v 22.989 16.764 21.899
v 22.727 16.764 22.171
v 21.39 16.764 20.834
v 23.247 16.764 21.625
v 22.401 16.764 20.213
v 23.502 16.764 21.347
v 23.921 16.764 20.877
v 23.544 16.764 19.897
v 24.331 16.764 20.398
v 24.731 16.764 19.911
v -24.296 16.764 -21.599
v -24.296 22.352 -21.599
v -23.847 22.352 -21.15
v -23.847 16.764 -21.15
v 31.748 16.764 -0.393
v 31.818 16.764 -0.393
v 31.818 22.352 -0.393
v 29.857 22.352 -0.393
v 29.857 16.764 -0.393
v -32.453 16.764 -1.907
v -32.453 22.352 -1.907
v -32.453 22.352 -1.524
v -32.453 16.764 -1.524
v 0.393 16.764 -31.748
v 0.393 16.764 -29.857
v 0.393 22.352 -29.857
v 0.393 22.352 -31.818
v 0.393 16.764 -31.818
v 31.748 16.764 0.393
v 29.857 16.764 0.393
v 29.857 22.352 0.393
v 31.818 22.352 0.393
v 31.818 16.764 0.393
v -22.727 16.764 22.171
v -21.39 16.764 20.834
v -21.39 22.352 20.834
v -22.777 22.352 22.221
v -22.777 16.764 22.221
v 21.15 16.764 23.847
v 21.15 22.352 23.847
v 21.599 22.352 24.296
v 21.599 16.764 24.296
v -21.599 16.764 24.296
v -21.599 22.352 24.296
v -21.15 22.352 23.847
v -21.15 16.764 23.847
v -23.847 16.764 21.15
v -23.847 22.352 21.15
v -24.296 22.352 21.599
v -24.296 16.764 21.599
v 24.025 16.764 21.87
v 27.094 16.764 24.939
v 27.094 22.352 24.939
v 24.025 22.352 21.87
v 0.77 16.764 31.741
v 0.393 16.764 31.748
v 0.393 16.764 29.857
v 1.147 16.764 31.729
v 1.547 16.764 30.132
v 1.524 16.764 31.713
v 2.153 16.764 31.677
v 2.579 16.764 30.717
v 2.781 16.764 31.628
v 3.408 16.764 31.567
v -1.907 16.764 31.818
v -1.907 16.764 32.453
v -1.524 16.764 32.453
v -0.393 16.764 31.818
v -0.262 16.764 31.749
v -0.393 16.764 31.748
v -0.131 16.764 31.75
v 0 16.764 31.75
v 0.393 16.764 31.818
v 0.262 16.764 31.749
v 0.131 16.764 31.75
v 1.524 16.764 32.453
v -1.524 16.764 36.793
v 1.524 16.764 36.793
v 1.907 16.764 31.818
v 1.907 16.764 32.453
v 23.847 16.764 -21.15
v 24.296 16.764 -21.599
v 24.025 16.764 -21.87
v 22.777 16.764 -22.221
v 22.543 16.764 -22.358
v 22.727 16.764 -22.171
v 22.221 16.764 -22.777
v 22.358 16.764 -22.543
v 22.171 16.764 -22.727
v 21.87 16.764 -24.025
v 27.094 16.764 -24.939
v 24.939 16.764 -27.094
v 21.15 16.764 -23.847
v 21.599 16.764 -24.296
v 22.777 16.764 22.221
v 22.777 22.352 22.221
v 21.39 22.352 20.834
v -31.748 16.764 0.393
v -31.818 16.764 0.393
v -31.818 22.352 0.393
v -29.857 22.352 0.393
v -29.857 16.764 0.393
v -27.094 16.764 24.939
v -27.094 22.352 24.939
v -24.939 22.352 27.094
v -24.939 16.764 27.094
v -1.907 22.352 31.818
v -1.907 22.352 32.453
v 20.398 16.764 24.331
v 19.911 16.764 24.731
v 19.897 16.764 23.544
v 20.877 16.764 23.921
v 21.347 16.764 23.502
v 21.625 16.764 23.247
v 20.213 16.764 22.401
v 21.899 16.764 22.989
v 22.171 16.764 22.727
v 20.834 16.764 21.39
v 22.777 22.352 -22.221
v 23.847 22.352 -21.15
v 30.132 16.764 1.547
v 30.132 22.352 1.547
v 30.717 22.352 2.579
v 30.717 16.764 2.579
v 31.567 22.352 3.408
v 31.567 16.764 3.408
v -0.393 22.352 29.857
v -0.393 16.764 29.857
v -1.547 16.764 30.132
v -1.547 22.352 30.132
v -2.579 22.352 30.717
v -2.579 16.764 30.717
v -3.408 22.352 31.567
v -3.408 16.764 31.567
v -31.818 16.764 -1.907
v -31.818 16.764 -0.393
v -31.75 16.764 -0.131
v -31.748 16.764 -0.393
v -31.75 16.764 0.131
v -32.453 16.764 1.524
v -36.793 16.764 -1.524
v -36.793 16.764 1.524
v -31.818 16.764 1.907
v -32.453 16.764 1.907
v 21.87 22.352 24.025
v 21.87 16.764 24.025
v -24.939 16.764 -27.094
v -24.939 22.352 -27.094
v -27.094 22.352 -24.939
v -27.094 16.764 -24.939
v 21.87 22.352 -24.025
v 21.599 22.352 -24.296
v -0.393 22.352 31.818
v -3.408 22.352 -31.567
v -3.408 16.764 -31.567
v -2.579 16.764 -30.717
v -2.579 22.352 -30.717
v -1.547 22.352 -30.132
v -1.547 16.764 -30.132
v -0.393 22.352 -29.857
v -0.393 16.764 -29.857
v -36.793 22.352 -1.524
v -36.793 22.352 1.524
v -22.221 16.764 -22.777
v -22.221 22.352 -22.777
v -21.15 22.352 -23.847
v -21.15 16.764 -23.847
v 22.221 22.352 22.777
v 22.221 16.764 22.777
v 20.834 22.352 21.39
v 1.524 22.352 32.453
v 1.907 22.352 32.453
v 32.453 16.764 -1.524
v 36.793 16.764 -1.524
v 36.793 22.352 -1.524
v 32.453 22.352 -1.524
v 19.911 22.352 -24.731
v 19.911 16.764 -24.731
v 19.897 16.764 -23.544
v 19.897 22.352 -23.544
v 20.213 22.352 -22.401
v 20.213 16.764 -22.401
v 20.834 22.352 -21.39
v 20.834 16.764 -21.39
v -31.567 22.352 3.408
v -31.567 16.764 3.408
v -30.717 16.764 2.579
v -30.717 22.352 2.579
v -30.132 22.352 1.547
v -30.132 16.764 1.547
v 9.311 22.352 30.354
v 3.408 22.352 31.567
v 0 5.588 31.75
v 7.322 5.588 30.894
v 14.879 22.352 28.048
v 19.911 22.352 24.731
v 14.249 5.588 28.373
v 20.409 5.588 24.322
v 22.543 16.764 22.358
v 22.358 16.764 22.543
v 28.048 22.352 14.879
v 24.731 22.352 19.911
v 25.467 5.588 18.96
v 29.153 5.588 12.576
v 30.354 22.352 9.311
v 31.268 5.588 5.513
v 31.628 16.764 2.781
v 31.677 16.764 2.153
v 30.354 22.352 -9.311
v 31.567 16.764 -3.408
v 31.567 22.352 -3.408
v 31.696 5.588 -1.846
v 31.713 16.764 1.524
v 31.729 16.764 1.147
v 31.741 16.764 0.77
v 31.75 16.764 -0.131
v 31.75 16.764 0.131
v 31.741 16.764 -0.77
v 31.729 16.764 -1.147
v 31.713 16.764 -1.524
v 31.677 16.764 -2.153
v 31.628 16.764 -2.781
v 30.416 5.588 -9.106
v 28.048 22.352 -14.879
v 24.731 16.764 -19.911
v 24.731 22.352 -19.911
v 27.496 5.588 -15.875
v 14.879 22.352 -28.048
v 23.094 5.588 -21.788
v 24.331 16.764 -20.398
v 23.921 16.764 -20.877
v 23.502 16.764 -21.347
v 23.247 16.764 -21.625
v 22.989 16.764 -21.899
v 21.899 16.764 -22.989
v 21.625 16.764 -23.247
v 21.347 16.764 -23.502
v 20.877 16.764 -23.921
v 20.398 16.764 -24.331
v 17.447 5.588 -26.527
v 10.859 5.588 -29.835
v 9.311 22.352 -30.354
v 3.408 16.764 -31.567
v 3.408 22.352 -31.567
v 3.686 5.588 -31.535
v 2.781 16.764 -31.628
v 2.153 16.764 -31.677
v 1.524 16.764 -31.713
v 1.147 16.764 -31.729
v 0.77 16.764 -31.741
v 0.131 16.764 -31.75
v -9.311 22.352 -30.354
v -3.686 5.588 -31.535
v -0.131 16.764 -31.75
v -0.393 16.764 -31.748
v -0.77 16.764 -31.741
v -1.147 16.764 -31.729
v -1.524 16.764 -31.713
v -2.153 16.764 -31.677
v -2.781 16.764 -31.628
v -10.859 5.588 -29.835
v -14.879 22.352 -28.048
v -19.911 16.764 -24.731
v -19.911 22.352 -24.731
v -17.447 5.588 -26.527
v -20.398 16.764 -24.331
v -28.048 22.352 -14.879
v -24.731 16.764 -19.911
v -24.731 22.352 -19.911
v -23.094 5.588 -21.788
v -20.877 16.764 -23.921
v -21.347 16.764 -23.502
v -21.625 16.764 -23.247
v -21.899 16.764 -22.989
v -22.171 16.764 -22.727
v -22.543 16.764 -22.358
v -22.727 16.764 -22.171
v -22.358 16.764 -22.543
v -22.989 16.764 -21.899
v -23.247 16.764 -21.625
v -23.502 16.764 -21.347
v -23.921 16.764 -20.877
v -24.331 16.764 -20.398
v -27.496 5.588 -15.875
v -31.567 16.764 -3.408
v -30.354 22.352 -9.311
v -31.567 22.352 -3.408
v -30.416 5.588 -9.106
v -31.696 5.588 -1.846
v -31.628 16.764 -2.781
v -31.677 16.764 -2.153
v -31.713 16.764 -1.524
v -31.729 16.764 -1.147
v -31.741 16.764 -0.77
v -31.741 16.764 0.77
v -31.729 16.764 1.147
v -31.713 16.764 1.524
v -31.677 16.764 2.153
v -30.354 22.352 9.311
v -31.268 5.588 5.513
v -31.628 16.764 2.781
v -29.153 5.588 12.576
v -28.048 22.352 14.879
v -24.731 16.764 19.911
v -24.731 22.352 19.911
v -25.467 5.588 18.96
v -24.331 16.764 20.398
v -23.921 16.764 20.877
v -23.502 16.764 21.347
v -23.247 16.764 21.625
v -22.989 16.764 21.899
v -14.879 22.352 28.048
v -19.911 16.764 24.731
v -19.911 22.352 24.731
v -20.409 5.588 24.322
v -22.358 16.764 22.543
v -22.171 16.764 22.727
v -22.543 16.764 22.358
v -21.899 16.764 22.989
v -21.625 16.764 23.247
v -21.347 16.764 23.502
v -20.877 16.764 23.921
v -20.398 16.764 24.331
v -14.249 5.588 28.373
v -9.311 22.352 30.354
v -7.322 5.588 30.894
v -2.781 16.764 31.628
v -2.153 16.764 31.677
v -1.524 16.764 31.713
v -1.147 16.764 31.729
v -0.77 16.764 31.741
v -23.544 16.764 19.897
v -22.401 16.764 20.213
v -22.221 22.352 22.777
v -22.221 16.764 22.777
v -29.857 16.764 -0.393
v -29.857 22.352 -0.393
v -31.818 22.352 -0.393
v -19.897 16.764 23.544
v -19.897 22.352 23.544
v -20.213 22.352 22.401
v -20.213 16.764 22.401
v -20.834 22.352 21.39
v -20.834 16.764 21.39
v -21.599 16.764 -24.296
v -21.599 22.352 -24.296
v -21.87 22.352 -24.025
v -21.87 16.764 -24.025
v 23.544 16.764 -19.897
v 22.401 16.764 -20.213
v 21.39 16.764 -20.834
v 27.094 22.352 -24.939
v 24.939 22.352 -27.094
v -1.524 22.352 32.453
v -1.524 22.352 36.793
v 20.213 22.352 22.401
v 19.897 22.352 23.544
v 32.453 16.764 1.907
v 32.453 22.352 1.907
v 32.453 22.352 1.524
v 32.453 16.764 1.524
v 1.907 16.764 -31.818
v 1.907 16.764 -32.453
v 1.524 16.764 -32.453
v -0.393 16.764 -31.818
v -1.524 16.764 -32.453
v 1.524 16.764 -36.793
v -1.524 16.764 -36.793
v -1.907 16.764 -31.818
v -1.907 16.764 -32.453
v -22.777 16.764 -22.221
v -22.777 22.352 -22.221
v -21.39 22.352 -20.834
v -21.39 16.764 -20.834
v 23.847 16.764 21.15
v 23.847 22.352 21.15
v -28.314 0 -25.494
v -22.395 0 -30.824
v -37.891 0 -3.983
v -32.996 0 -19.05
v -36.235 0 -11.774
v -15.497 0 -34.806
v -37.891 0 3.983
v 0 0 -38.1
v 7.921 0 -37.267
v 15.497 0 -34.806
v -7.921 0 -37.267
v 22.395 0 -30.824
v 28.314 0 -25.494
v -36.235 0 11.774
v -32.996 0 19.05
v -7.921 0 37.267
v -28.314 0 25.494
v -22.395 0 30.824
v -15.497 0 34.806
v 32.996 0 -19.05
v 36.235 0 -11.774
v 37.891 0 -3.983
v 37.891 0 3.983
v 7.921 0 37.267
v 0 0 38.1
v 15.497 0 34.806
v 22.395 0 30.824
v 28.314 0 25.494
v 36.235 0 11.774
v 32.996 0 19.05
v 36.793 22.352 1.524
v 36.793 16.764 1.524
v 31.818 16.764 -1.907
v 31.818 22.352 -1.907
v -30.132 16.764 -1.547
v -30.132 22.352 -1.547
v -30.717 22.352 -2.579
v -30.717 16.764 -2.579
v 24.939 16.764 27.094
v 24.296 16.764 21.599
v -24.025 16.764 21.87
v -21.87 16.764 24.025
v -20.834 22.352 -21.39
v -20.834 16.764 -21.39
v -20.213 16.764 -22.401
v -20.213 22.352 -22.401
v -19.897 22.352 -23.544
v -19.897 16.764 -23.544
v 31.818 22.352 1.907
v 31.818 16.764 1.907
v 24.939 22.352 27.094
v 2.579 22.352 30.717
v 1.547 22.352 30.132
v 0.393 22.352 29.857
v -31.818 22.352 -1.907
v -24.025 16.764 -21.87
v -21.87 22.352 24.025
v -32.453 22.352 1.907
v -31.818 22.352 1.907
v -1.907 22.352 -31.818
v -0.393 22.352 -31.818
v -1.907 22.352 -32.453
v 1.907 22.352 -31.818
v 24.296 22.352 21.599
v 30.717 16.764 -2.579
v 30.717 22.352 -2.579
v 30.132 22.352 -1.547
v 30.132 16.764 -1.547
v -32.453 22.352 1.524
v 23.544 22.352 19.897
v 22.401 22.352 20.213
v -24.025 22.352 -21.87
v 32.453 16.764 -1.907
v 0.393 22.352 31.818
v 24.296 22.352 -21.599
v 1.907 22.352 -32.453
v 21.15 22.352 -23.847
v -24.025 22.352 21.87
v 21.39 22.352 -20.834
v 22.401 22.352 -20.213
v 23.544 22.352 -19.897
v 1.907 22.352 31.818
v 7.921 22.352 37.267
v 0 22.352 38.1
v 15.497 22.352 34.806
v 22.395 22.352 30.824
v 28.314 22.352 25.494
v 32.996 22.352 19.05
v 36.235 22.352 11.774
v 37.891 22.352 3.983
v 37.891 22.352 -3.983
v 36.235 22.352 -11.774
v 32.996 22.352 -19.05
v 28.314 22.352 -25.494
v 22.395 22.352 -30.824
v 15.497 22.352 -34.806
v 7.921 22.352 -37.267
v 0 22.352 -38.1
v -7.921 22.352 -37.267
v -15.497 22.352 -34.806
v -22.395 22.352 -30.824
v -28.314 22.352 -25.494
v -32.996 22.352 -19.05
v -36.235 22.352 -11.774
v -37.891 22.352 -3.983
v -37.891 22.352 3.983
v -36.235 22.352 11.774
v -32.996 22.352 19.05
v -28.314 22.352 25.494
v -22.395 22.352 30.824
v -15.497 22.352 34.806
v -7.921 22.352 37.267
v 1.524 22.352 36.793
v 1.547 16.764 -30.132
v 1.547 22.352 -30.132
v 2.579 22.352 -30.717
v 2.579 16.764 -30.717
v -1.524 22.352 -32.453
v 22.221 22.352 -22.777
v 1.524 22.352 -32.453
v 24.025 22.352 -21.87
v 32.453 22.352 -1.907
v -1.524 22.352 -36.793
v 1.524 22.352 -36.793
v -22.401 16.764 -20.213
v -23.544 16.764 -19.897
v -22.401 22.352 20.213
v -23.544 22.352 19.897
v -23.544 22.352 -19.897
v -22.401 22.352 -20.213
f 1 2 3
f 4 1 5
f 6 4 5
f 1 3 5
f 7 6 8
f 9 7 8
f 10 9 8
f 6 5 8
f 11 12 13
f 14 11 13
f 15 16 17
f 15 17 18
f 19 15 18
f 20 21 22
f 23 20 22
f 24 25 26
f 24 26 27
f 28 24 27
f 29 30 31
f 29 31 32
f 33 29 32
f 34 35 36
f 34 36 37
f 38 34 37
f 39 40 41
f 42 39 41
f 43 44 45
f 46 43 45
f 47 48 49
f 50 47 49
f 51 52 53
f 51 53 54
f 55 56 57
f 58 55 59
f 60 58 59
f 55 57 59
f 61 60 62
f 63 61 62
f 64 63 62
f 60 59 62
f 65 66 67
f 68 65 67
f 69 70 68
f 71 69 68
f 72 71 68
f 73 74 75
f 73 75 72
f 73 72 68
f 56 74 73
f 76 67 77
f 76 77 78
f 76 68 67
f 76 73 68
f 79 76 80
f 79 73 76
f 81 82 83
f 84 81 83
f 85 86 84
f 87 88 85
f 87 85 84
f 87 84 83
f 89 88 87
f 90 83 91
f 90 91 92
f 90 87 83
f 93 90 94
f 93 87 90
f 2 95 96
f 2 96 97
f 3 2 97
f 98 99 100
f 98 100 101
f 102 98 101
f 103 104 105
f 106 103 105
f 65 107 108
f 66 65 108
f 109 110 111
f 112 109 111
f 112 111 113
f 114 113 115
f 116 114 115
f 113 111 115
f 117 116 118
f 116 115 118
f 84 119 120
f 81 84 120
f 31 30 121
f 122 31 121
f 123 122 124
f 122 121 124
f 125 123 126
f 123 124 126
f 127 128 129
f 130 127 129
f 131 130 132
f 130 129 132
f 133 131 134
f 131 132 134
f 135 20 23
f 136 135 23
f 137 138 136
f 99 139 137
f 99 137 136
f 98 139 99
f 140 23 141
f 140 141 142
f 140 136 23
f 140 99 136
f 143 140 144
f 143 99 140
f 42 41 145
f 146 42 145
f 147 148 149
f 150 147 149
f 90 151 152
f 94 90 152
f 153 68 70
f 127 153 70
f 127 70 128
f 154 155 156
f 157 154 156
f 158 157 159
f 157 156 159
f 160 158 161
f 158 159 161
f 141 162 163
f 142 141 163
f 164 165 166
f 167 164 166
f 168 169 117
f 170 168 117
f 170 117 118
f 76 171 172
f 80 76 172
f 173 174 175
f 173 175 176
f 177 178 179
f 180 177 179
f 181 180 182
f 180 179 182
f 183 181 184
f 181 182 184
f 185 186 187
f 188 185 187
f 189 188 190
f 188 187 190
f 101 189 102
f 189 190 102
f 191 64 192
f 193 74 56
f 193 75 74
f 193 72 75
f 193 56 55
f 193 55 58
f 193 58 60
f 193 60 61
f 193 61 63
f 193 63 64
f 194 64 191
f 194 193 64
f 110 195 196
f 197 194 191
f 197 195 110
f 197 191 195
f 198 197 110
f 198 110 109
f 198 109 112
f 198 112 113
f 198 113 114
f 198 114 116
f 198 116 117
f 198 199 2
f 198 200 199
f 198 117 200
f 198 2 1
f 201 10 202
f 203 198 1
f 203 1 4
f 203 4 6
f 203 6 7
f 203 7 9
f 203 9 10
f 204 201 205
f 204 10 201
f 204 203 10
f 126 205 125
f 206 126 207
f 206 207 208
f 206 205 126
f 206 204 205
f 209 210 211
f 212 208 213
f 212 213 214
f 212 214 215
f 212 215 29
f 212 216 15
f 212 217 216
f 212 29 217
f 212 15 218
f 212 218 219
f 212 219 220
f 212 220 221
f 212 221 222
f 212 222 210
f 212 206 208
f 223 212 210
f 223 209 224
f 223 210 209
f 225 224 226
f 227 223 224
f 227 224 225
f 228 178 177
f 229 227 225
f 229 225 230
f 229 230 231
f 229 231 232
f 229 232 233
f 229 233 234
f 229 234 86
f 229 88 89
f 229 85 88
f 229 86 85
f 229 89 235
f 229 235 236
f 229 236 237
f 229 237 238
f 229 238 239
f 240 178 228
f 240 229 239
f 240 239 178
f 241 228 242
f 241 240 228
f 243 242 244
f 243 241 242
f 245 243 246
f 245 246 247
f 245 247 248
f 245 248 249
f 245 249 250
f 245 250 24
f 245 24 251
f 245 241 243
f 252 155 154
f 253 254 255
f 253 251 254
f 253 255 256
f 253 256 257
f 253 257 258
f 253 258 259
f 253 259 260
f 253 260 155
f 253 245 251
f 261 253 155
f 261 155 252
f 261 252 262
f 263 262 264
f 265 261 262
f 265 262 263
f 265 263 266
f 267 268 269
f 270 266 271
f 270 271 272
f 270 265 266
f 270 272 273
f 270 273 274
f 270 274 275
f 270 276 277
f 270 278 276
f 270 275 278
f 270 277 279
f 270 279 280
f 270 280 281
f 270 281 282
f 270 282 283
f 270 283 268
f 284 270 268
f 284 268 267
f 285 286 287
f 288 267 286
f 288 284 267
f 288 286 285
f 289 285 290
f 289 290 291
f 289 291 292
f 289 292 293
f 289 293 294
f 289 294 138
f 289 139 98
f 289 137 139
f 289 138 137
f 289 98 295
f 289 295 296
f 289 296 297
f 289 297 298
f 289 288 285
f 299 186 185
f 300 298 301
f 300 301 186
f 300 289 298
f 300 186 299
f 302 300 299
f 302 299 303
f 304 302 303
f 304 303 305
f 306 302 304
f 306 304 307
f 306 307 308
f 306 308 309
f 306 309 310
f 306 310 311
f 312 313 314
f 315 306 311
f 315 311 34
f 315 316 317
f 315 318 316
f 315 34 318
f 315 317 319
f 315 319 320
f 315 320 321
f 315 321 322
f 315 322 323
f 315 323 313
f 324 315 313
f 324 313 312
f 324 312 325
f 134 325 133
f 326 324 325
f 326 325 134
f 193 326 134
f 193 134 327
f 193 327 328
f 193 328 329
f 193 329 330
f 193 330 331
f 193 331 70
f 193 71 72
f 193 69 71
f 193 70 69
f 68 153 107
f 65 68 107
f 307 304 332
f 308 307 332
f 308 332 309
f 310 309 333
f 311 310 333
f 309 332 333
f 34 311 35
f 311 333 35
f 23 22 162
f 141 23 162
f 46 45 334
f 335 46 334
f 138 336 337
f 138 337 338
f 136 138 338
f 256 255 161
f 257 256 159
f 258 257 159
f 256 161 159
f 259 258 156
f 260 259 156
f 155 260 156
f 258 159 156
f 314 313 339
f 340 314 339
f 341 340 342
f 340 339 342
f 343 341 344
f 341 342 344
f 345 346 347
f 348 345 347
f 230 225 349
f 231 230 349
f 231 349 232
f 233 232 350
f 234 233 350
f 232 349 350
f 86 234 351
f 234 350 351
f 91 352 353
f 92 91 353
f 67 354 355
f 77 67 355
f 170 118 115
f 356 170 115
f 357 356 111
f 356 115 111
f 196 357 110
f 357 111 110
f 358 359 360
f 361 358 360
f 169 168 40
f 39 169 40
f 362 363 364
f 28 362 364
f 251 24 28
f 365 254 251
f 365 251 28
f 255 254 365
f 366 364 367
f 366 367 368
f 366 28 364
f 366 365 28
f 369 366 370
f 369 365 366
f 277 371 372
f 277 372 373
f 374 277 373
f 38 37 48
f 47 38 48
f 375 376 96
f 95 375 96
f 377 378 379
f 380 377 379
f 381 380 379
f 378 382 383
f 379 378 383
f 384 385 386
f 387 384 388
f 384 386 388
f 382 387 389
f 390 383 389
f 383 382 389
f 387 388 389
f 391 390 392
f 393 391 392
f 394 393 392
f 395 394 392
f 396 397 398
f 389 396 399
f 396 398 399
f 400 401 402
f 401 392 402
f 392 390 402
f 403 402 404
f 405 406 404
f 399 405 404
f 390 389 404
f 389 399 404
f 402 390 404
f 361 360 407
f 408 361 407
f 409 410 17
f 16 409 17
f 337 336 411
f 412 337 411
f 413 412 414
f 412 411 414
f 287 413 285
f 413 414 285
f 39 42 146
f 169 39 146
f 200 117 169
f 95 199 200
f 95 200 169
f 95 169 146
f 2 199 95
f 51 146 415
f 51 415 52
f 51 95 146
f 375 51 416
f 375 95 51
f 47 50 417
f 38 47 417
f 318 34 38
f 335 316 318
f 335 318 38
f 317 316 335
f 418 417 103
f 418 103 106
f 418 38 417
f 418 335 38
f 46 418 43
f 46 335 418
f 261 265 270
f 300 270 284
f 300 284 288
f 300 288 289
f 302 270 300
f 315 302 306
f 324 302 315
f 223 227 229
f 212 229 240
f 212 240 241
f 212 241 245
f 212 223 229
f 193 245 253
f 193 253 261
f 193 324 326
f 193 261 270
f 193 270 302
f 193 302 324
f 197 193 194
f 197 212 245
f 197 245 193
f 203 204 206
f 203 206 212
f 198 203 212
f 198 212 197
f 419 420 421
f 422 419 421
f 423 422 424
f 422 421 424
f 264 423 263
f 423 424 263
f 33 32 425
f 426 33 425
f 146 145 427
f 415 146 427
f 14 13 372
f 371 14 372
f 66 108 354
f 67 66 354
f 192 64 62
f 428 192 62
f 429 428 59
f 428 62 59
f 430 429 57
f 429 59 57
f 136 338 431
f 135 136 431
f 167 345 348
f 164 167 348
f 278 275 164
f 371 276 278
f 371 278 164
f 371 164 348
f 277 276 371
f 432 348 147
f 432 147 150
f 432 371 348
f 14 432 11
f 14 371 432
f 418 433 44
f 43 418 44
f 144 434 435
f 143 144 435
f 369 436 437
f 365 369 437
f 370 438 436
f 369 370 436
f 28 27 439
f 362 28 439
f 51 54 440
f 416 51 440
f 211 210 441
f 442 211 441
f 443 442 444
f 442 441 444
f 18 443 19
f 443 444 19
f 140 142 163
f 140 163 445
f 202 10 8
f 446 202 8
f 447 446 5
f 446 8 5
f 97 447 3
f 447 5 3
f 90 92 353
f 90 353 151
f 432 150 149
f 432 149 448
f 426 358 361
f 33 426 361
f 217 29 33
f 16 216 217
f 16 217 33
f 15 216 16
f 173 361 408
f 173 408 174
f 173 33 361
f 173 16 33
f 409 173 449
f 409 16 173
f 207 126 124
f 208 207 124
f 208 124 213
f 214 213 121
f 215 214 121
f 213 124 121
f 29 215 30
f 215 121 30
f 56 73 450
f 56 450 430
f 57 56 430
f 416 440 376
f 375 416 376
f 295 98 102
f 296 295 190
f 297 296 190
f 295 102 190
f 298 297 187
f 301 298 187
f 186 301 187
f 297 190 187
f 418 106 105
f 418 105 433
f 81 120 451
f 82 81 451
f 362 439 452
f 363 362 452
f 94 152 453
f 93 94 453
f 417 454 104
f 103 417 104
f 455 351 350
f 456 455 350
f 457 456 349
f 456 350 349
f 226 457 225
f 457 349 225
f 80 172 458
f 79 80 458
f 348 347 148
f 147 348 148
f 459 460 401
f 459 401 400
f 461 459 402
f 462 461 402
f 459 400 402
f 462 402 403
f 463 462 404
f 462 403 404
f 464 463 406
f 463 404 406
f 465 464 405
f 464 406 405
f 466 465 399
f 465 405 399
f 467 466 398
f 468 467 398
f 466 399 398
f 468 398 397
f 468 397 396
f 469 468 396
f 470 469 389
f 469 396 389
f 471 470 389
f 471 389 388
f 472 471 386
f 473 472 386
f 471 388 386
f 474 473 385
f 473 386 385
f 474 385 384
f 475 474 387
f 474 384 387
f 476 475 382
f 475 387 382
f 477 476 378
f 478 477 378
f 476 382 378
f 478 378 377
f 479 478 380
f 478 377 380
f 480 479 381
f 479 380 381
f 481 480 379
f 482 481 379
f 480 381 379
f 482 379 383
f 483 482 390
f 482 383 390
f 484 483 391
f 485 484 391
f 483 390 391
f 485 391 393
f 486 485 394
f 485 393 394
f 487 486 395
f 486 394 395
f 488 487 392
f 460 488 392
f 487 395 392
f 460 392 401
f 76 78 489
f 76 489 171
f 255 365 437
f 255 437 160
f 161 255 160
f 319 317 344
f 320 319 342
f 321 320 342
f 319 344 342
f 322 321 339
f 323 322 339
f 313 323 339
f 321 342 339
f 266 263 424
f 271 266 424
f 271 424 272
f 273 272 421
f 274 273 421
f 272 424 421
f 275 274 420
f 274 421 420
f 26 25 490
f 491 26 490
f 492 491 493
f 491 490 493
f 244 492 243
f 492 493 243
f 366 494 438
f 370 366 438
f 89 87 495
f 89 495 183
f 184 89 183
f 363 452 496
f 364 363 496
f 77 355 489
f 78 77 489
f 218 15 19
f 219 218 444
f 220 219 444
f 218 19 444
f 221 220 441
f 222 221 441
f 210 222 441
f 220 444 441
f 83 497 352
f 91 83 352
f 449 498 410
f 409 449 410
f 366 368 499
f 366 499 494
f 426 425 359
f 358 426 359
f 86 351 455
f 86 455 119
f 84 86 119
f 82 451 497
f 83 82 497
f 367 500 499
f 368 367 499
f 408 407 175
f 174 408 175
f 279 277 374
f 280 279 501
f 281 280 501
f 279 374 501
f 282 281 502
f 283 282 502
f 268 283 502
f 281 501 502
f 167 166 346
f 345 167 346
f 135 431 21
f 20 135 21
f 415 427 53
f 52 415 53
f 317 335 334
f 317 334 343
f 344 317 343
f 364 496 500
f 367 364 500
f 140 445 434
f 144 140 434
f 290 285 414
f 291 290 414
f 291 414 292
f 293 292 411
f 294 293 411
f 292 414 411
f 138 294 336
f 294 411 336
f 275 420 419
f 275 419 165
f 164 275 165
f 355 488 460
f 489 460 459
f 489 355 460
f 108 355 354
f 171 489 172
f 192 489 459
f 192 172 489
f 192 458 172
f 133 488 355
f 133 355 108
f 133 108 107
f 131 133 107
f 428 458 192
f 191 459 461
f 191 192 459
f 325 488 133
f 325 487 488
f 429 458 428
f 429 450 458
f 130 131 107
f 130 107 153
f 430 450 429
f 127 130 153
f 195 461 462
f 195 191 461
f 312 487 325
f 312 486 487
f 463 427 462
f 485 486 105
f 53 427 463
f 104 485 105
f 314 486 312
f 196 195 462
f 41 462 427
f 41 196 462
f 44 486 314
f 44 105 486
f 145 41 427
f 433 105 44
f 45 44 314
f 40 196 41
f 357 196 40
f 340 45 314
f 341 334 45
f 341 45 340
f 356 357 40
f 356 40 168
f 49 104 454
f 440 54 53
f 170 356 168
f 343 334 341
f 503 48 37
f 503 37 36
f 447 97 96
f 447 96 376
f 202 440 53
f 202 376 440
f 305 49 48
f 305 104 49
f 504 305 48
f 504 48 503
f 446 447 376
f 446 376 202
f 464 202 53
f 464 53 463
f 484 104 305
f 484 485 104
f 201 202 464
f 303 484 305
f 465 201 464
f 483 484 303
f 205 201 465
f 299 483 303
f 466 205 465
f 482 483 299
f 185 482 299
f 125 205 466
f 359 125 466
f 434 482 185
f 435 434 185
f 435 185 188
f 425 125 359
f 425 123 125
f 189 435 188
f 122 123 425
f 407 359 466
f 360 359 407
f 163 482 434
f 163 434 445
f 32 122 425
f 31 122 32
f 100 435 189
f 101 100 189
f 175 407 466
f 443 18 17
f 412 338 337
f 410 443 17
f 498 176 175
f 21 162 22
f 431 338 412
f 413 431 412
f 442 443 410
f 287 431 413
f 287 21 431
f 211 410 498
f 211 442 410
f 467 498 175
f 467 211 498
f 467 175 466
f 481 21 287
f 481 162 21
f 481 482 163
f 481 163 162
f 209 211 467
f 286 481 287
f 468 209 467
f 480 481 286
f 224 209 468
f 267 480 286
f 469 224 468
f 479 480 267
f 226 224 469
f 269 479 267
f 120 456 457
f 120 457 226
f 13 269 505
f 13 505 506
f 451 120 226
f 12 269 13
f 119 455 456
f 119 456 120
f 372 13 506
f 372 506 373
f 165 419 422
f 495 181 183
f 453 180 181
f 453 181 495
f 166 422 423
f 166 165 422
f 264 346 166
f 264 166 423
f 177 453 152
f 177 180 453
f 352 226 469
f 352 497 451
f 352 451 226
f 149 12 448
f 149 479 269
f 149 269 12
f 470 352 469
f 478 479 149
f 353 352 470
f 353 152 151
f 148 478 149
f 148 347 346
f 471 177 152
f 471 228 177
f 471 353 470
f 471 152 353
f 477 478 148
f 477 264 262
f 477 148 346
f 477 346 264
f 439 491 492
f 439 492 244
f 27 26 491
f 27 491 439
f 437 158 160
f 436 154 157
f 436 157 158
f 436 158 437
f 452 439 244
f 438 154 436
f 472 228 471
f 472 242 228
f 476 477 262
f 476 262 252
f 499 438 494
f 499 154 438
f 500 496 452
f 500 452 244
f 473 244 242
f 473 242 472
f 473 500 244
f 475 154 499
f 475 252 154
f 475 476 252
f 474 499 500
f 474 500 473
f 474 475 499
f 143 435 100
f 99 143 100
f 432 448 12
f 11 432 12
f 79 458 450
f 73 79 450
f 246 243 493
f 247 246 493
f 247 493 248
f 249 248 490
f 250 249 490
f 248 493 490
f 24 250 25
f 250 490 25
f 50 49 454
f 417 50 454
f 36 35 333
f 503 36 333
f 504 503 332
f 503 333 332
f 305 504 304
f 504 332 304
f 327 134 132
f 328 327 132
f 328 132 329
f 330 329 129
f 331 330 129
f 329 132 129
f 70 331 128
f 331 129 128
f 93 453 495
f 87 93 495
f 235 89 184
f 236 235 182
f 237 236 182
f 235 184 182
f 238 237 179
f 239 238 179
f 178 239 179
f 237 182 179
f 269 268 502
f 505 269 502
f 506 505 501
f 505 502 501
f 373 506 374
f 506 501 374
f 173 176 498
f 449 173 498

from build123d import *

# Parameters (mm, degrees)
SKETCH1_R           = 38.1
BOSS_EXTRUDE1_DEPTH = 5.588
SKETCH5_R           = 38.1
SKETCH5_R_2         = 31.75
BOSS_EXTRUDE3_DEPTH = 16.764
CUT_EXTRUDE2_START  = -5.588
CUT_EXTRUDE2_DEPTH  = 5.588
BOSS_EXTRUDE4_START = -5.588
BOSS_EXTRUDE4_DEPTH = 5.588
CIRPATTERN1_COUNT   = 8


with BuildPart() as part:
    # Sketch1 → Boss-Extrude1 (new body)
    with BuildSketch(Plane(origin=(0, 0, 0), x_dir=(1, 0, 0), z_dir=(0, 1, 0))):
        Circle(SKETCH1_R)
    extrude(amount=BOSS_EXTRUDE1_DEPTH)

    # Sketch5 → Boss-Extrude3 (add)
    with BuildSketch(Plane(origin=(0, 5.588, 0), x_dir=(1, 0, 0), z_dir=(0, 1, 0))):
        Circle(SKETCH5_R)
        Circle(SKETCH5_R_2, mode=Mode.SUBTRACT)
    extrude(amount=BOSS_EXTRUDE3_DEPTH)

    # Sketch6 → Cut-Extrude2 (cut)
    with BuildSketch(Plane(origin=(0, 22.352, 0), x_dir=(1, 0, 0), z_dir=(0, 1, 0)).offset(CUT_EXTRUDE2_START)):
        with BuildLine():
            Line((-1.524, -32.452967385), (-1.524, -36.793402908))
            Line((-1.524, -36.793402908), (1.524, -36.793402908))
            Line((1.524, -36.793402908), (1.524, -32.452967385))
            Line((1.524, -32.452967385), (1.907415329, -32.452967385))
            Line((1.907415329, -32.452967385), (1.907415329, -31.817967385))
            Line((1.907415329, -31.817967385), (0.393317037, -31.817967385))
            Line((0.393317037, -31.817967385), (0.393317037, -31.747563713))
            ThreePointArc((0.393317037, -31.747563713), (0, -31.75), (-0.393317037, -31.747563713))
            Line((-0.393317037, -31.747563713), (-0.393317037, -31.817967385))
            Line((-0.393317037, -31.817967385), (-1.907415329, -31.817967385))
            Line((-1.907415329, -31.817967385), (-1.907415329, -32.452967385))
            Line((-1.907415329, -32.452967385), (-1.524, -32.452967385))
        make_face()
    cut_extrude2 = extrude(amount=CUT_EXTRUDE2_DEPTH, mode=Mode.SUBTRACT)

    # Sketch6<4> → Boss-Extrude4 (add)
    with BuildSketch(Plane(origin=(0, 22.352, 0), x_dir=(1, 0, 0), z_dir=(0, 1, 0)).offset(BOSS_EXTRUDE4_START)):
        with BuildLine():
            ThreePointArc((-3.407999769, -31.566565185), (-1.90281173, -31.69292993), (-0.393317037, -31.747563713))
            Line((-0.393317037, -31.747563713), (-0.393317037, -29.857063133))
            ThreePointArc((-0.393317037, -29.857063133), (-2.08401096, -30.388474513), (-3.407999769, -31.566565185))
        make_face()
        with BuildLine():
            ThreePointArc((0.393317037, -31.747563713), (1.90281173, -31.69292993), (3.407999769, -31.566565185))
            ThreePointArc((3.407999769, -31.566565185), (2.08401096, -30.388474513), (0.393317037, -29.857063133))
            Line((0.393317037, -29.857063133), (0.393317037, -31.747563713))
        make_face()
    boss_extrude4 = extrude(amount=BOSS_EXTRUDE4_DEPTH)

    # CirPattern1: Cut-Extrude2, Boss-Extrude4 ×8 about axis
    cirpattern1_axis = Axis((0, 22.352, 0), (0, 1, 0))
    add([cut_extrude2.rotate(cirpattern1_axis, i * 360 / CIRPATTERN1_COUNT) for i in range(1, CIRPATTERN1_COUNT)], mode=Mode.SUBTRACT)
    add([boss_extrude4.rotate(cirpattern1_axis, i * 360 / CIRPATTERN1_COUNT) for i in range(1, CIRPATTERN1_COUNT)])


solid = part.part
